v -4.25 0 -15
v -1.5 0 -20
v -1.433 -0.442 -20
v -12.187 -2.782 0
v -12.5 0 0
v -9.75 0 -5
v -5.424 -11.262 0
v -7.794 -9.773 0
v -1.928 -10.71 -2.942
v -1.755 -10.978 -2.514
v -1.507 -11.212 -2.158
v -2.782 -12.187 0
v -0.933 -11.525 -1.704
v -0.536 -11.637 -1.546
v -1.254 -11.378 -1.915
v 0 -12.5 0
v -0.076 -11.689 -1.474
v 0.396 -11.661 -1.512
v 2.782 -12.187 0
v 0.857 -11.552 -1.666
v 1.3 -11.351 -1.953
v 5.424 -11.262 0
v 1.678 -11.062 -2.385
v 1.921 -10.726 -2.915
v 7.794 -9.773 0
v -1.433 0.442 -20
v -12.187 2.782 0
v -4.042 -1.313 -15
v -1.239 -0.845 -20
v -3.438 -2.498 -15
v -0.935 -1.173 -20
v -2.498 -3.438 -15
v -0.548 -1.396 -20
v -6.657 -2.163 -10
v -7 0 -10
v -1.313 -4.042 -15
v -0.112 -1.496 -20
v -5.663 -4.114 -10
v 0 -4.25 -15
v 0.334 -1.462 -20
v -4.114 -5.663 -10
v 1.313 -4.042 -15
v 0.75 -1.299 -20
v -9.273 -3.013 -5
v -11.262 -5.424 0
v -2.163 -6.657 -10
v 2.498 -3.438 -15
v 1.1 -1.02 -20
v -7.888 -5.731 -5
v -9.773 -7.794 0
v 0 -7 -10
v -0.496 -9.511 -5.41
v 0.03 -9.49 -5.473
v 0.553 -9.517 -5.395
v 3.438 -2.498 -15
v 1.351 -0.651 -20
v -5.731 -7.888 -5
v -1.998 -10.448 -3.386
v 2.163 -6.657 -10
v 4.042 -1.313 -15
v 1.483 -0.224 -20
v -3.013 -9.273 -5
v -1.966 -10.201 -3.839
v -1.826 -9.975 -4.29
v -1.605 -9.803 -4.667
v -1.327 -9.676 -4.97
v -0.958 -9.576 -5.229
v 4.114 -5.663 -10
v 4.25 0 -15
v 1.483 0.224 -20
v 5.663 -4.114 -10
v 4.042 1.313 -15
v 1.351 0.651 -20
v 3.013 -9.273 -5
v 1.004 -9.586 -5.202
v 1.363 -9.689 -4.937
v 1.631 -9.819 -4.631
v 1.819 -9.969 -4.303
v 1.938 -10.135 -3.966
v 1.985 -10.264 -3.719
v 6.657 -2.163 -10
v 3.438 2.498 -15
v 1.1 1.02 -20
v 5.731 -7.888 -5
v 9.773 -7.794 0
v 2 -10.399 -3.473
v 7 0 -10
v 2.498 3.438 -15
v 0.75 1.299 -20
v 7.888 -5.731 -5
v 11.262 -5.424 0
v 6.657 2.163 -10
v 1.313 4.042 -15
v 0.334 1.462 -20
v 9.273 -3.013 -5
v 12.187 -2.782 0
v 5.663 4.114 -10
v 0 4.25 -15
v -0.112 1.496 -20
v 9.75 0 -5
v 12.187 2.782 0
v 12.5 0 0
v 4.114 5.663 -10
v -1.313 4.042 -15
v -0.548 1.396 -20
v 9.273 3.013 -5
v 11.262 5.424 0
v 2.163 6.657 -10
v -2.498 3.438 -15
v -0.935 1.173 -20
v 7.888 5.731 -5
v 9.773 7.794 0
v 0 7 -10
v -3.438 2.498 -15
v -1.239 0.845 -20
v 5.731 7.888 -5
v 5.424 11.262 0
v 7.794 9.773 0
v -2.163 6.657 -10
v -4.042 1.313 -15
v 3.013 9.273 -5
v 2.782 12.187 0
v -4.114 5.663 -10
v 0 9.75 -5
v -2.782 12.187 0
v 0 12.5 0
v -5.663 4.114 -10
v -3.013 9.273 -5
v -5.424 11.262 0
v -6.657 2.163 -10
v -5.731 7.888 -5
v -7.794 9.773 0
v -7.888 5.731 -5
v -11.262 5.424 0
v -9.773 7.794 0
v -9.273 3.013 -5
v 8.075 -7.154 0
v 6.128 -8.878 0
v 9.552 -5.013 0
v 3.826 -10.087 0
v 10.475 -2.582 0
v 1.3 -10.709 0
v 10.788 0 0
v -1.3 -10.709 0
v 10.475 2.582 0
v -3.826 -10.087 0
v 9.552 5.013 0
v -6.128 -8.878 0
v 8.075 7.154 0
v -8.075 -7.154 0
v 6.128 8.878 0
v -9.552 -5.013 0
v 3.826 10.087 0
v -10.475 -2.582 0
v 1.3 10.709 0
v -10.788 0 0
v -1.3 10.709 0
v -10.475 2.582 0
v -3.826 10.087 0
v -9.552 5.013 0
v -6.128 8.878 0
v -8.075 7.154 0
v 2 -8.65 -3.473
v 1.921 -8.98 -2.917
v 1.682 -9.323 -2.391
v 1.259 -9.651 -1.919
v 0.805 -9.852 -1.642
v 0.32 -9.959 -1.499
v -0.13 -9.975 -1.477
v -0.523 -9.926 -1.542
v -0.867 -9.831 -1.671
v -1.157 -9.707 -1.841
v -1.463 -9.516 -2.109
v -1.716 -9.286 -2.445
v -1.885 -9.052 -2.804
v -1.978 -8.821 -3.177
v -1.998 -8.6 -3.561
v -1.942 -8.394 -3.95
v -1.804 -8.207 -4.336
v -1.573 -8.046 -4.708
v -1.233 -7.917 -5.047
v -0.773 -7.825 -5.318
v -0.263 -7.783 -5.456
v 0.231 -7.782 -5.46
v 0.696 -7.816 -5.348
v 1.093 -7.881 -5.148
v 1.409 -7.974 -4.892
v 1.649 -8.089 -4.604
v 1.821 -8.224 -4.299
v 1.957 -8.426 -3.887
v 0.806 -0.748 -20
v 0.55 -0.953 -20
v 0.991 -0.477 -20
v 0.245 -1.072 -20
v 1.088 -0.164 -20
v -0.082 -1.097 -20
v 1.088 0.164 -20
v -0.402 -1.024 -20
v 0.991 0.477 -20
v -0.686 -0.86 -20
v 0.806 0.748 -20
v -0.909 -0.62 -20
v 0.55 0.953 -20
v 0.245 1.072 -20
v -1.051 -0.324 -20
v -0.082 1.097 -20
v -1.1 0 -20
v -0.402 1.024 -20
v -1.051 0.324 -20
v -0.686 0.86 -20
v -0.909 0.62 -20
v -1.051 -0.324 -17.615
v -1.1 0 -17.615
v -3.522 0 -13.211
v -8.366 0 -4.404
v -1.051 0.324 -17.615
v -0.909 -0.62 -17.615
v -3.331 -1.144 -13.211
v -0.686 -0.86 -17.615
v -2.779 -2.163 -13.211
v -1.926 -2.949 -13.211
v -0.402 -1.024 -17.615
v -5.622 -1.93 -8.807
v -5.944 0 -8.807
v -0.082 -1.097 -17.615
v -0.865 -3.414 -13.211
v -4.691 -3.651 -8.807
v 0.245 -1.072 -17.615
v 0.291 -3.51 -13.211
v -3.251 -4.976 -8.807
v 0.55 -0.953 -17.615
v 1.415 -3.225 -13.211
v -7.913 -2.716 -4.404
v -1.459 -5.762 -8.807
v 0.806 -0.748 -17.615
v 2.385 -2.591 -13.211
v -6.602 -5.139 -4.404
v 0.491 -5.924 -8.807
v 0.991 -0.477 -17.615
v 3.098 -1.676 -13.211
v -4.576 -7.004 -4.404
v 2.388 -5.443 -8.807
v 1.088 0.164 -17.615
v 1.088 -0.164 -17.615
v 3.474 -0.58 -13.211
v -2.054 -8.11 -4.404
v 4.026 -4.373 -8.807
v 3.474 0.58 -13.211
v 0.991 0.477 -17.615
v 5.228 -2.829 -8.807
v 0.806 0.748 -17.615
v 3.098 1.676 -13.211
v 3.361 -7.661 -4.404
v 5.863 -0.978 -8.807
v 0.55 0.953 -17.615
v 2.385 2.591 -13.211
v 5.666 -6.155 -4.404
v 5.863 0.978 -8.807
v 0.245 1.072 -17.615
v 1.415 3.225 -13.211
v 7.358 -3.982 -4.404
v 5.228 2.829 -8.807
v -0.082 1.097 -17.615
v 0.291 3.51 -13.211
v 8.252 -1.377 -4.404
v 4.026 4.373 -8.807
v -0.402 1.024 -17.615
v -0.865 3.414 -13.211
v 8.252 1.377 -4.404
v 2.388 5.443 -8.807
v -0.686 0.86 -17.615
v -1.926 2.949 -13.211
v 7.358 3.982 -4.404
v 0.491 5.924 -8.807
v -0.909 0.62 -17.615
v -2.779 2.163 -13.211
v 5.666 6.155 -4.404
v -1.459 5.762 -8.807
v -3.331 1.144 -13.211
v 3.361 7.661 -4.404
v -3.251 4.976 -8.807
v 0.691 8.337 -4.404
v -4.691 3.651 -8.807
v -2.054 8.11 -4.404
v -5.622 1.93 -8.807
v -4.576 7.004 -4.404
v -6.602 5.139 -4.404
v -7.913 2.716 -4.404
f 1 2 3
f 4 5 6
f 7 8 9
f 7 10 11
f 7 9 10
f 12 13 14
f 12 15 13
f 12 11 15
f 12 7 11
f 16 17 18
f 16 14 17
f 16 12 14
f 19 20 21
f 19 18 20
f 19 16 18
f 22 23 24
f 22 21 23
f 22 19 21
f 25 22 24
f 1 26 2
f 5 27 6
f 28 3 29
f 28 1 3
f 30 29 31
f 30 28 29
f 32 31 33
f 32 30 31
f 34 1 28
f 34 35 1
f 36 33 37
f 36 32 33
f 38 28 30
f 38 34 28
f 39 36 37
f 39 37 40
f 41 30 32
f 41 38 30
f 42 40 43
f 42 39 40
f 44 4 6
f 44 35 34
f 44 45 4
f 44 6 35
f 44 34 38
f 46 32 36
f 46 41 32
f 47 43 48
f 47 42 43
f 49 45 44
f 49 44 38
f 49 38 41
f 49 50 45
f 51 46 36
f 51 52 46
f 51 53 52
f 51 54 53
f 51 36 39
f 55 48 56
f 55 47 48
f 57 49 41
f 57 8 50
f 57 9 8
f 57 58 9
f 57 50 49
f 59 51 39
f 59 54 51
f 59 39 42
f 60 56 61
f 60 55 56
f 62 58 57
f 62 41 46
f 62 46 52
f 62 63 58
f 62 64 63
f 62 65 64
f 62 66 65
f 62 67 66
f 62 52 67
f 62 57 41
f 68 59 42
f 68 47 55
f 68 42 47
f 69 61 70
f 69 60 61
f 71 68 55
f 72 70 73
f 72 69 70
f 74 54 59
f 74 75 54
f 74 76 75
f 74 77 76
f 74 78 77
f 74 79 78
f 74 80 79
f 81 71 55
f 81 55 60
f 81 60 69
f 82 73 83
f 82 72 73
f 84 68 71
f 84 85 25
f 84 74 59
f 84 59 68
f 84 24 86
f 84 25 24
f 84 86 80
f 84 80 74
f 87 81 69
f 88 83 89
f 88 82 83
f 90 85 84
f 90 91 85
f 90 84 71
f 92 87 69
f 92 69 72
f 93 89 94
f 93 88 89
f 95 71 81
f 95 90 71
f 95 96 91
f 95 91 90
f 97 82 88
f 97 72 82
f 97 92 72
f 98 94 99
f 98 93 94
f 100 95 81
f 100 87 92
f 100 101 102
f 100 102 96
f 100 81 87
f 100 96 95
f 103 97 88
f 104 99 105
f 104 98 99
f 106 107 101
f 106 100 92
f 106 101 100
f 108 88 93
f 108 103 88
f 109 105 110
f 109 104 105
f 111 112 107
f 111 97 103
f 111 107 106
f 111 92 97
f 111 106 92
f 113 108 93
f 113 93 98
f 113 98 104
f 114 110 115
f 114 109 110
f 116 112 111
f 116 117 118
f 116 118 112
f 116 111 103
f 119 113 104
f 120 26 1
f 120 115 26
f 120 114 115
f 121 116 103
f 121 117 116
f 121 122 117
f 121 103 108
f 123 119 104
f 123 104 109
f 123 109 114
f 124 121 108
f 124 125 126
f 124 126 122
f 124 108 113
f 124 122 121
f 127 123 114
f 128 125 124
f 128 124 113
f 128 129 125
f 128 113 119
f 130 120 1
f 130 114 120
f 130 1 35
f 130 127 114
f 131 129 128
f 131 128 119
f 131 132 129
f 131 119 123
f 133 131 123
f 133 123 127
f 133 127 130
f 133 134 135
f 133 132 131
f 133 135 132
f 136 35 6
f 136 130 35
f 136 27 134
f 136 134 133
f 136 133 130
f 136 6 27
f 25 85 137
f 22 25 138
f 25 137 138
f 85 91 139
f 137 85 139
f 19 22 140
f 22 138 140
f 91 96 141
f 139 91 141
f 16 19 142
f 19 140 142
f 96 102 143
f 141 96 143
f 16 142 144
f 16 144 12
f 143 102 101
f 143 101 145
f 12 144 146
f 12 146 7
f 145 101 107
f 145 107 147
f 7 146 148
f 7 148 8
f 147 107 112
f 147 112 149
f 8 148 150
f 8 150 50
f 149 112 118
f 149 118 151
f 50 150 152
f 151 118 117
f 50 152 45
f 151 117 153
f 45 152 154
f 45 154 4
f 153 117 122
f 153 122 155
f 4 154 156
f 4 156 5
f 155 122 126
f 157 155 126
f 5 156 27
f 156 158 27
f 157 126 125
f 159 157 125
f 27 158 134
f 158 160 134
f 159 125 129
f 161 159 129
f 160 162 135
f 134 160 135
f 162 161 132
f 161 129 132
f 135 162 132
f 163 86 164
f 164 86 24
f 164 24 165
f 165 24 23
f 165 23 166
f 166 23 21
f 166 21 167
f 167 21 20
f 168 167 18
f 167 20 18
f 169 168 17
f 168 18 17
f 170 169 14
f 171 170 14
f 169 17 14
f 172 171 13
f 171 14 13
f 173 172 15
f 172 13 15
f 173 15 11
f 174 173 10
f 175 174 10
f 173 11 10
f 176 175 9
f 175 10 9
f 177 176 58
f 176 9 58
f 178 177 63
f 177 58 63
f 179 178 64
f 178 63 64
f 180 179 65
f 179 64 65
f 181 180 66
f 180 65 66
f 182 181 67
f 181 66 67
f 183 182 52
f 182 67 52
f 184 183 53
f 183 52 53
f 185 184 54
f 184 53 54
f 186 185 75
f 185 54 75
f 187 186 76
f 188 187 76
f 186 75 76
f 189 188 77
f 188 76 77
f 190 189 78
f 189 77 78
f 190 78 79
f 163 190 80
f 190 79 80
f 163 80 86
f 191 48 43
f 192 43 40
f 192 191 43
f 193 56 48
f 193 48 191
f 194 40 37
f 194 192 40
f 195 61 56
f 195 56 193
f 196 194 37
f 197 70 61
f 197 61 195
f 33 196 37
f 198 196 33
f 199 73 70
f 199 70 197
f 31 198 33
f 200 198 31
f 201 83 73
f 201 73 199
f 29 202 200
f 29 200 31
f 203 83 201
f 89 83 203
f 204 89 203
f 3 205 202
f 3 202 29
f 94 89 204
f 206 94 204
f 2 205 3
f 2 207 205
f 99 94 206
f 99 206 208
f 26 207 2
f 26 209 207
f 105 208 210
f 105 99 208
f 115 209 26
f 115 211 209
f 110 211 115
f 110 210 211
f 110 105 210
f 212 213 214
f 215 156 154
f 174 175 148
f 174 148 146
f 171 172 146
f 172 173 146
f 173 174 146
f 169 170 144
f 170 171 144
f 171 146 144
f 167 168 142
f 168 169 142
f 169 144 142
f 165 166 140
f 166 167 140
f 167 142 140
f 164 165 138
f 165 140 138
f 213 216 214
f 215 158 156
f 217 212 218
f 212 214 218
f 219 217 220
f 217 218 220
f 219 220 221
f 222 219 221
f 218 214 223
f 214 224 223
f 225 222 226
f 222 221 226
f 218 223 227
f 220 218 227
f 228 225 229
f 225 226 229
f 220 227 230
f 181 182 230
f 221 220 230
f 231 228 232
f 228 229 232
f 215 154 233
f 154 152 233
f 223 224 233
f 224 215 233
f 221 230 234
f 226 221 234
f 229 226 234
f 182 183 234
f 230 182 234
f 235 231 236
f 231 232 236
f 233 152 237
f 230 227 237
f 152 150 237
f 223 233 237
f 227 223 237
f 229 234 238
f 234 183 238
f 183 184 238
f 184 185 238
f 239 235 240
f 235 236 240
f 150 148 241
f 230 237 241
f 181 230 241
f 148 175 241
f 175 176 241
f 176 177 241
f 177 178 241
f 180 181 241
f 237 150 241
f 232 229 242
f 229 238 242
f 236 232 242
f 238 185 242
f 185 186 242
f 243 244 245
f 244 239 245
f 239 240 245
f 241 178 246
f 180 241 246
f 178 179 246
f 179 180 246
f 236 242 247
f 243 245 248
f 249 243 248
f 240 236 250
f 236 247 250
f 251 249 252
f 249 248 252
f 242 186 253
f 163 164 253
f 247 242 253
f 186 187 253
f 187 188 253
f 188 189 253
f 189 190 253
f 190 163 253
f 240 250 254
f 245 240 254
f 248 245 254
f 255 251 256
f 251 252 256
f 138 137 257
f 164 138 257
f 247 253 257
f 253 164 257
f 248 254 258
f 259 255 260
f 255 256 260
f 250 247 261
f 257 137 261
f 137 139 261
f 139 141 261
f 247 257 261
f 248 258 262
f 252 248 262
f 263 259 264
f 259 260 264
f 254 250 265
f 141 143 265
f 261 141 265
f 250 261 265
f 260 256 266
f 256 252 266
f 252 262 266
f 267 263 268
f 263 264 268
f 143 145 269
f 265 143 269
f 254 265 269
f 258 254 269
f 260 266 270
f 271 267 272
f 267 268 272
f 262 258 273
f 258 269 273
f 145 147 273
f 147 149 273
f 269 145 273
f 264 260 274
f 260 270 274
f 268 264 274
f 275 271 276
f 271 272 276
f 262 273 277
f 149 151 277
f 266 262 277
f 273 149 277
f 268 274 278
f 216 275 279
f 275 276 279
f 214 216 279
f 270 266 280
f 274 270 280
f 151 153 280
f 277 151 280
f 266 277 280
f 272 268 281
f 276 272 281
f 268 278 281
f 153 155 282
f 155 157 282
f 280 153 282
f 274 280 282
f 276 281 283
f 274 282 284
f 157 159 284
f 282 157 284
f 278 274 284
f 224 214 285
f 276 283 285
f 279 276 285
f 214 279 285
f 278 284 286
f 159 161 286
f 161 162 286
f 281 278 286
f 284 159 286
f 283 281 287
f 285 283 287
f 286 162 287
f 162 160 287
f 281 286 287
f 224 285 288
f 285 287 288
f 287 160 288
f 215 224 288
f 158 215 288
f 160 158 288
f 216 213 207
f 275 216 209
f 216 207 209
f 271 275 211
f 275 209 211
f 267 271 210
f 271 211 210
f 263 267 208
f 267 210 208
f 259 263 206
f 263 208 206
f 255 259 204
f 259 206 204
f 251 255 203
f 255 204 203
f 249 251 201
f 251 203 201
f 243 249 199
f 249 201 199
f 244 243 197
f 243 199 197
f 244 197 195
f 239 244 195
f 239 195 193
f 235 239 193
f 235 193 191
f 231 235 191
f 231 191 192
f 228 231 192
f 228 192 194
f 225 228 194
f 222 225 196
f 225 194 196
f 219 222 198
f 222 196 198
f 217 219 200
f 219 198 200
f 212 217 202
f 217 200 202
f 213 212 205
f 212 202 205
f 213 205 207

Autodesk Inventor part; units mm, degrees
ref_plane "YZ Plane" through (0, 0, 0) normal (1, 0, 0) x (0, 1, 0)
ref_plane "XZ Plane" through (0, 0, 0) normal (0, 1, 0) x (-1, 0, 0)
ref_plane "XY Plane" through (0, 0, 0) normal (0, 0, 1) x (1, 0, 0)
sketch "Esquisse1" plane through (0, 0, 0) normal (0, 0, 1) x (1, 0, 0)
  circle A0 centre (0, 0) radius 12.5
  dimension "d0" = 25
extrude "Extrusion1" add sketch "Esquisse1" along normal blind 20
shell "Coque1" thickness 1.5 removed faces 1 at (2.488, -2.432, 20)
ref_plane "Plan de construction1" through (0, 0, -20) normal (0, 0, -1) x (-1, 0, 0)
sketch "Esquisse2" plane through (0, 0, -20) normal (0, 0, -1) x (-1, 0, 0)
  circle A0 centre (0, 0) radius 1.5
  dimension "d5" = 3
loft "Lissage1" add profiles "Esquisse2" section 2 edges at (-12.5, 0, 0)
shell "Coque2" thickness 1.5 removed faces 1 at (0.3952, -0.1996, -20)
sketch "Esquisse3" plane through (0, 0, -20) normal (0, 0, -1) x (-1, 0, 0)
  circle A0 centre (0, 0) radius 1.1
  dimension "d11" = 2.2
extrude "Extrusion2" cut sketch "Esquisse3" against normal blind 10
sketch "Esquisse4" plane through (0, 0, 20) normal (0, 0, 1) x (1, 0, 0)
  circle A0 centre (0, 0) radius 12.5 projected
  point P0 (0, -12.5)
ref_plane "Plan de construction2" through (0, -12.5, 20) normal (0, -1, 0) x (1, 0, 0)
sketch "Esquisse5" plane through (0, -12.5, 20) normal (0, -1, 0) x (1, 0, 0)
  circle A0 centre (0, -23.4729) radius 1
  circle A1 centre (0, -23.4729) radius 1.5
  point P0 (0, -20)
  dimension "d14" = 2
  dimension "d15" = 3
extrude "Extrusion3" add sketch "Esquisse5" along normal mid plane 10
sketch "Esquisse6" plane through (0, -17.5, -3.4729) normal (0, -1, 0) x (1, 0, 0)
  circle A0 centre (0, 0) radius 1
  point P0 (0, 3.4729)
extrude "Extrusion4" cut sketch "Esquisse6" against normal blind 15
sketch "Esquisse7" plane through (0, -17.5, -3.4729) normal (0, -1, 0) x (1, 0, 0)
  point P0 (0, 3.4729)
sketch "Esquisse8" plane through (0, -17.5, -3.4729) normal (0, -1, 0) x (1, 0, 0)
  circle A0 centre (0, 0) radius 1 projected
  circle A1 centre (0, 0) radius 2
  point P0 (0, 3.4729)
  dimension "d20" = 4
extrude "Extrusion5" cut sketch "Esquisse8" against normal blind 10
sketch "Esquisse9" plane through (0, 0, 0) normal (0, 0, -1) x (-1, 0, 0)
  circle A0 centre (0, 0) radius 20.0804
extrude "Extrusion6" cut sketch "Esquisse9" against normal blind 20
properties part number "EMBOUT"
